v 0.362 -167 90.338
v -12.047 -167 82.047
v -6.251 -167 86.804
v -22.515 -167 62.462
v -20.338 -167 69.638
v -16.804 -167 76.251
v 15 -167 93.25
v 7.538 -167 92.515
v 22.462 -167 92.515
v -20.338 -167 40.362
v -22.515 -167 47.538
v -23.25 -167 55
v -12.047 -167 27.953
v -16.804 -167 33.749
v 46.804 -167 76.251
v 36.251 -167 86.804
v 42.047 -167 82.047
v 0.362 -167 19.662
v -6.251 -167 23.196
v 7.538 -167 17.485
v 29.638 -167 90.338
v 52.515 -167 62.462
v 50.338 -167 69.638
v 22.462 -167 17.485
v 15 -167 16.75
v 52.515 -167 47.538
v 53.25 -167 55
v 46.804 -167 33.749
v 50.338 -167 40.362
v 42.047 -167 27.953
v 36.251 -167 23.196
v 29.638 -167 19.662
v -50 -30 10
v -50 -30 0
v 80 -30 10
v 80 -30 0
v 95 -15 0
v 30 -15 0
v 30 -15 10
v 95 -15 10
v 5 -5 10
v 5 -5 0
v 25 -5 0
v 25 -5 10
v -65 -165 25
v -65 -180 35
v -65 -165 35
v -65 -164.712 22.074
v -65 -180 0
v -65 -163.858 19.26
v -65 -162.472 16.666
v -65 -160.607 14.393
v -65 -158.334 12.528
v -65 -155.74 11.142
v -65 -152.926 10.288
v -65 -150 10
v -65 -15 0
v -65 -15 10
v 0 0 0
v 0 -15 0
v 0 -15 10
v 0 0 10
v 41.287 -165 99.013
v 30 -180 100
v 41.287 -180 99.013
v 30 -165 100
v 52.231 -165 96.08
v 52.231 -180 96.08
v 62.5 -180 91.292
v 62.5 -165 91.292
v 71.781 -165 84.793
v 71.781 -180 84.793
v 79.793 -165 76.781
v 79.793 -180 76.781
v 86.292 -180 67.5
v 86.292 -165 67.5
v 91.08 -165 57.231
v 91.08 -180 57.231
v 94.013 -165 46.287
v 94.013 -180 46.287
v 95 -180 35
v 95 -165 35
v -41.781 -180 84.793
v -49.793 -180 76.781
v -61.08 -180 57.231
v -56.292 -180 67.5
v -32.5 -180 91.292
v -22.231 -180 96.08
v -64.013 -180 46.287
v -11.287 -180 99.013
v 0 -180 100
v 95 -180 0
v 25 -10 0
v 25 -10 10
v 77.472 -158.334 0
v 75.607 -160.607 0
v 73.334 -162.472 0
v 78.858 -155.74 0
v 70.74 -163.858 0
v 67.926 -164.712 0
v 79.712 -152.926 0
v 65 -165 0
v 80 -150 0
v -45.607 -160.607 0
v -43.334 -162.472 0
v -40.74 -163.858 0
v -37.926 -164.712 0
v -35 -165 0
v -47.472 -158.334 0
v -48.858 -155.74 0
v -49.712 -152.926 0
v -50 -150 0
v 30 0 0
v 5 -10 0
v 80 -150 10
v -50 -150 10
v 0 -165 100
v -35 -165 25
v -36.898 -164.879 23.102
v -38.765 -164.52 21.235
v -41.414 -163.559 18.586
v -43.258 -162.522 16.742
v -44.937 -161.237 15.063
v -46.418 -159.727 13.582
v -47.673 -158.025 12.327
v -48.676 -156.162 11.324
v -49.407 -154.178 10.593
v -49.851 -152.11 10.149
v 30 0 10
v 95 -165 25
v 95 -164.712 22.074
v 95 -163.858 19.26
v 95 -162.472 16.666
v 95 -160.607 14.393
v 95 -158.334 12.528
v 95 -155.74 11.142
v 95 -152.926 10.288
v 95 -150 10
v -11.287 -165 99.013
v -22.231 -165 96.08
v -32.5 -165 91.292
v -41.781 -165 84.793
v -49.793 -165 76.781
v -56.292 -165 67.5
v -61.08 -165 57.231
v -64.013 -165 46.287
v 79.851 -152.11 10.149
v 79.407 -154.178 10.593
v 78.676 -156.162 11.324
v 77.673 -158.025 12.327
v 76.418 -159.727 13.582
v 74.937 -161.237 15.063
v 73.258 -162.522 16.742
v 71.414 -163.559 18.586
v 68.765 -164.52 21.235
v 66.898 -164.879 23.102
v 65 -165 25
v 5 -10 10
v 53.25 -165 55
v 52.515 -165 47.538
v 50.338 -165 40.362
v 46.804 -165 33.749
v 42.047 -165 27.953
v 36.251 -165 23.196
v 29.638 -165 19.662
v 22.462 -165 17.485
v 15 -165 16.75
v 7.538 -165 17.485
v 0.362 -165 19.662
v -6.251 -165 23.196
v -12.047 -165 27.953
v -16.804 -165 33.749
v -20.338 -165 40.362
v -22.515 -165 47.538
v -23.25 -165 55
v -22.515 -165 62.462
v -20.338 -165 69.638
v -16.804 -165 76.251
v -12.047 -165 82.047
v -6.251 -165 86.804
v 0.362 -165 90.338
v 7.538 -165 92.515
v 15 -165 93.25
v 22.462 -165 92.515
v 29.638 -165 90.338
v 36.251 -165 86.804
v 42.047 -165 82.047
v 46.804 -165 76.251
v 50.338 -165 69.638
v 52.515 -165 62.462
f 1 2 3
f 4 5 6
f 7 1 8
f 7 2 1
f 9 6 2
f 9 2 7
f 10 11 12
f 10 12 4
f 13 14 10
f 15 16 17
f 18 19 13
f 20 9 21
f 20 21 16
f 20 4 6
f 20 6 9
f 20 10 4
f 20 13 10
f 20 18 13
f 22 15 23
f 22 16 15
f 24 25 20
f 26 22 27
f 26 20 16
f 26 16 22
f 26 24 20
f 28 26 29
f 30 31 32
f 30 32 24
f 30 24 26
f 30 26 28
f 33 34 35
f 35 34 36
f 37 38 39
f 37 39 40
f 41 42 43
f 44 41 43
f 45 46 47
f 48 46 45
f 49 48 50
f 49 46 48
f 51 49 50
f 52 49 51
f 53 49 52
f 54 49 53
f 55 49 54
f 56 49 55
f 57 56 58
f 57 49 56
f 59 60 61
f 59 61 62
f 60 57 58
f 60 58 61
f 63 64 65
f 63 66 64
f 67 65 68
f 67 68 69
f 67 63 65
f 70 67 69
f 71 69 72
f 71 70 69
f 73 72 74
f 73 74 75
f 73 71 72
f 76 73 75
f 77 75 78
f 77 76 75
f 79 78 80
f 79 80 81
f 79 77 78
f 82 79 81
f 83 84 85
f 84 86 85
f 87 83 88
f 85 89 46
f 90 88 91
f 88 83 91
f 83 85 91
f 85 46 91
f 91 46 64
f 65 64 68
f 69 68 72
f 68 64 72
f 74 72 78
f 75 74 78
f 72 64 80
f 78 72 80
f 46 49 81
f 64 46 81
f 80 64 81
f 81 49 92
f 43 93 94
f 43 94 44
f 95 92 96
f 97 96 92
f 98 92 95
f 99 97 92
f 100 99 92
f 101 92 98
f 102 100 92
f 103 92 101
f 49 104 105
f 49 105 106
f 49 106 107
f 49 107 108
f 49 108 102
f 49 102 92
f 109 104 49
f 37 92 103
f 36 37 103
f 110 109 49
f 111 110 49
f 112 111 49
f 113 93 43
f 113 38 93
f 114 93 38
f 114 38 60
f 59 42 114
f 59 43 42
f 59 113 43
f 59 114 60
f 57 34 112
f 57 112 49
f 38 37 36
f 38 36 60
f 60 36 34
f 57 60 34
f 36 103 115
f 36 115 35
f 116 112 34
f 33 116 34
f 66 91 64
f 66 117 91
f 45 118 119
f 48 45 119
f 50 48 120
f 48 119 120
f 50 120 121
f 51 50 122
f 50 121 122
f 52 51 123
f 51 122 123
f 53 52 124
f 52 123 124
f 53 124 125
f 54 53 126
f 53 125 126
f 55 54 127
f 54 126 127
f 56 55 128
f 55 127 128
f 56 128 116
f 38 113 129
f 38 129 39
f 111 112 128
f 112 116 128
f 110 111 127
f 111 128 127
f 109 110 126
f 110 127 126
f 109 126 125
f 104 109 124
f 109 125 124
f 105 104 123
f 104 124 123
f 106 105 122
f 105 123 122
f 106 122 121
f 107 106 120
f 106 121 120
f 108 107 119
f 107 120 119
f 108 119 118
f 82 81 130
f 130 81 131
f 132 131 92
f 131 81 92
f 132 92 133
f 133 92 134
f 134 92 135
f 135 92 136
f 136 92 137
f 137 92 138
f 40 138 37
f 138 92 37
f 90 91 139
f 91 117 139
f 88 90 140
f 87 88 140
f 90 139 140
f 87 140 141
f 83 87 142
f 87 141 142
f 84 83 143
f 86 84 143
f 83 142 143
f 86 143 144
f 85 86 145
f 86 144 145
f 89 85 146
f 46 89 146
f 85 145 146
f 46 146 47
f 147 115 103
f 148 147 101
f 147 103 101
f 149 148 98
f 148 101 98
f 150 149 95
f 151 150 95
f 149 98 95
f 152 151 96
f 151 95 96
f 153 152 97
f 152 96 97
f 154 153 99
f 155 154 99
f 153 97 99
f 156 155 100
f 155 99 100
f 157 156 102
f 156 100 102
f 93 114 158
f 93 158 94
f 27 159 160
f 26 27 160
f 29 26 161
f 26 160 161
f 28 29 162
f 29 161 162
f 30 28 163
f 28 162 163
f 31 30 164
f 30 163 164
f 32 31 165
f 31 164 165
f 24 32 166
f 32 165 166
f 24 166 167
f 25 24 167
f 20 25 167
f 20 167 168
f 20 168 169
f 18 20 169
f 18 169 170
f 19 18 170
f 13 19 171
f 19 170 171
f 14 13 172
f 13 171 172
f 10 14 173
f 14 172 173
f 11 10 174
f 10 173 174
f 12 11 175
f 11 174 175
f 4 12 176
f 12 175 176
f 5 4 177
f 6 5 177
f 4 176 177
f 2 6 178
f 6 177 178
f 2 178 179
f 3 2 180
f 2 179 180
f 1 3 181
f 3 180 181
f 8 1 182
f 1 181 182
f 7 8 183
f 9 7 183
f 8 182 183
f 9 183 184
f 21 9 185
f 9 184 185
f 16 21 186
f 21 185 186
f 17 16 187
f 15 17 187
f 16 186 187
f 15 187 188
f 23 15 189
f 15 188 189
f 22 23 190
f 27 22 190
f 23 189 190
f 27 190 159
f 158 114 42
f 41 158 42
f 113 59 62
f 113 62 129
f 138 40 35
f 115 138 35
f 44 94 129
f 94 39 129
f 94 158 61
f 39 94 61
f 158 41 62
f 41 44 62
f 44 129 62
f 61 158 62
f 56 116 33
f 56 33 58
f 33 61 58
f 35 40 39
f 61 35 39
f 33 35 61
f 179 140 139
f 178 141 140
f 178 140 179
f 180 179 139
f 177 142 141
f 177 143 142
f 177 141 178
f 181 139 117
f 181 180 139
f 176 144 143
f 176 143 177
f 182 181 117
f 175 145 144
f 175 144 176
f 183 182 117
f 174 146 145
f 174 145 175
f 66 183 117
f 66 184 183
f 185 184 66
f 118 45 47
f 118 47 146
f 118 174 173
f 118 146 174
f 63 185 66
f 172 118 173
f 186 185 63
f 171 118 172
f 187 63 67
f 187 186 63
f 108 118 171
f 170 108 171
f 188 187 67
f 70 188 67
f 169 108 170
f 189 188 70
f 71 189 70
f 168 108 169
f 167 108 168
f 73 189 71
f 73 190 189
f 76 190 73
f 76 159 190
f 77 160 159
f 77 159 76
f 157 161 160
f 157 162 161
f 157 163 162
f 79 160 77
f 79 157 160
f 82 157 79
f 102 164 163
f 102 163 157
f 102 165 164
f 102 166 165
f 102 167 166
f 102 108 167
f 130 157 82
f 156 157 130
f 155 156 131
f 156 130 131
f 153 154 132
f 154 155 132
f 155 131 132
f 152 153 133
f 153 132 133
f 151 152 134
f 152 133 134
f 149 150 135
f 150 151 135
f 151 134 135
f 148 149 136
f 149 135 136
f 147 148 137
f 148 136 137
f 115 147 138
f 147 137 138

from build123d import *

# Parameters (mm, degrees)
SKETCH_1_W          = 20
SKETCH_1_H          = 5
SKETCH_1_W_2        = 130
SKETCH_1_H_2        = 135
EXTRUDE_1_DEPTH     = 10
SKETCH_2_W          = 160
SKETCH_2_H          = 15
EXTRUDE_2_DEPTH     = 90
SKETCH_3_R          = 38.25
CUT_EXTRUDE_1_DEPTH = 2
FILLET_1_R          = 15
FILLET_2_R          = 15
FILLET_3_R          = 65


with BuildPart() as part:
    # 草图1 → 凸台-拉伸1 (new body)
    with BuildSketch(Plane.XY):
        Polygon((0, 0), (30, 0), (30, -15), (95, -15), (95, -180), (-65, -180), (-65, -15), (0, -15), align=None)
        with Locations((15, -7.5)):
            Rectangle(SKETCH_1_W, SKETCH_1_H, mode=Mode.SUBTRACT)
        with Locations((15, -97.5)):
            Rectangle(SKETCH_1_W_2, SKETCH_1_H_2, mode=Mode.SUBTRACT)
    extrude(amount=EXTRUDE_1_DEPTH)

    # 草图2 → 凸台-拉伸2 (add)
    with BuildSketch(Plane.XY.offset(10)):
        with Locations((15, -172.5)):
            Rectangle(SKETCH_2_W, SKETCH_2_H)
    extrude(amount=EXTRUDE_2_DEPTH)

    # 草图3 → 切除-拉伸1 (cut)
    with BuildSketch(Plane(origin=(0, -165, 0), x_dir=(1, 0, 0), z_dir=(0, 1, 0))):
        with Locations((15, -55)):
            Circle(SKETCH_3_R)
    extrude(amount=-CUT_EXTRUDE_1_DEPTH, mode=Mode.SUBTRACT)

    # 圆角1
    fillet_1_edges = [part.edges().sort_by_distance(p)[0] for p in [
        (-57.5, -165, 10),
        (87.5, -165, 10),
    ]]
    fillet(fillet_1_edges, radius=FILLET_1_R)

    # 圆角2
    fillet_2_edges = [part.edges().sort_by_distance(p)[0] for p in [
        (-50, -165, 17.5),
        (80, -165, 17.5),
    ]]
    fillet(fillet_2_edges, radius=FILLET_2_R)

    # 圆角3
    fillet_3_edges = [part.edges().sort_by_distance(p)[0] for p in [
        (-65, -172.5, 100),
        (95, -172.5, 100),
    ]]
    fillet(fillet_3_edges, radius=FILLET_3_R)


solid = part.part
